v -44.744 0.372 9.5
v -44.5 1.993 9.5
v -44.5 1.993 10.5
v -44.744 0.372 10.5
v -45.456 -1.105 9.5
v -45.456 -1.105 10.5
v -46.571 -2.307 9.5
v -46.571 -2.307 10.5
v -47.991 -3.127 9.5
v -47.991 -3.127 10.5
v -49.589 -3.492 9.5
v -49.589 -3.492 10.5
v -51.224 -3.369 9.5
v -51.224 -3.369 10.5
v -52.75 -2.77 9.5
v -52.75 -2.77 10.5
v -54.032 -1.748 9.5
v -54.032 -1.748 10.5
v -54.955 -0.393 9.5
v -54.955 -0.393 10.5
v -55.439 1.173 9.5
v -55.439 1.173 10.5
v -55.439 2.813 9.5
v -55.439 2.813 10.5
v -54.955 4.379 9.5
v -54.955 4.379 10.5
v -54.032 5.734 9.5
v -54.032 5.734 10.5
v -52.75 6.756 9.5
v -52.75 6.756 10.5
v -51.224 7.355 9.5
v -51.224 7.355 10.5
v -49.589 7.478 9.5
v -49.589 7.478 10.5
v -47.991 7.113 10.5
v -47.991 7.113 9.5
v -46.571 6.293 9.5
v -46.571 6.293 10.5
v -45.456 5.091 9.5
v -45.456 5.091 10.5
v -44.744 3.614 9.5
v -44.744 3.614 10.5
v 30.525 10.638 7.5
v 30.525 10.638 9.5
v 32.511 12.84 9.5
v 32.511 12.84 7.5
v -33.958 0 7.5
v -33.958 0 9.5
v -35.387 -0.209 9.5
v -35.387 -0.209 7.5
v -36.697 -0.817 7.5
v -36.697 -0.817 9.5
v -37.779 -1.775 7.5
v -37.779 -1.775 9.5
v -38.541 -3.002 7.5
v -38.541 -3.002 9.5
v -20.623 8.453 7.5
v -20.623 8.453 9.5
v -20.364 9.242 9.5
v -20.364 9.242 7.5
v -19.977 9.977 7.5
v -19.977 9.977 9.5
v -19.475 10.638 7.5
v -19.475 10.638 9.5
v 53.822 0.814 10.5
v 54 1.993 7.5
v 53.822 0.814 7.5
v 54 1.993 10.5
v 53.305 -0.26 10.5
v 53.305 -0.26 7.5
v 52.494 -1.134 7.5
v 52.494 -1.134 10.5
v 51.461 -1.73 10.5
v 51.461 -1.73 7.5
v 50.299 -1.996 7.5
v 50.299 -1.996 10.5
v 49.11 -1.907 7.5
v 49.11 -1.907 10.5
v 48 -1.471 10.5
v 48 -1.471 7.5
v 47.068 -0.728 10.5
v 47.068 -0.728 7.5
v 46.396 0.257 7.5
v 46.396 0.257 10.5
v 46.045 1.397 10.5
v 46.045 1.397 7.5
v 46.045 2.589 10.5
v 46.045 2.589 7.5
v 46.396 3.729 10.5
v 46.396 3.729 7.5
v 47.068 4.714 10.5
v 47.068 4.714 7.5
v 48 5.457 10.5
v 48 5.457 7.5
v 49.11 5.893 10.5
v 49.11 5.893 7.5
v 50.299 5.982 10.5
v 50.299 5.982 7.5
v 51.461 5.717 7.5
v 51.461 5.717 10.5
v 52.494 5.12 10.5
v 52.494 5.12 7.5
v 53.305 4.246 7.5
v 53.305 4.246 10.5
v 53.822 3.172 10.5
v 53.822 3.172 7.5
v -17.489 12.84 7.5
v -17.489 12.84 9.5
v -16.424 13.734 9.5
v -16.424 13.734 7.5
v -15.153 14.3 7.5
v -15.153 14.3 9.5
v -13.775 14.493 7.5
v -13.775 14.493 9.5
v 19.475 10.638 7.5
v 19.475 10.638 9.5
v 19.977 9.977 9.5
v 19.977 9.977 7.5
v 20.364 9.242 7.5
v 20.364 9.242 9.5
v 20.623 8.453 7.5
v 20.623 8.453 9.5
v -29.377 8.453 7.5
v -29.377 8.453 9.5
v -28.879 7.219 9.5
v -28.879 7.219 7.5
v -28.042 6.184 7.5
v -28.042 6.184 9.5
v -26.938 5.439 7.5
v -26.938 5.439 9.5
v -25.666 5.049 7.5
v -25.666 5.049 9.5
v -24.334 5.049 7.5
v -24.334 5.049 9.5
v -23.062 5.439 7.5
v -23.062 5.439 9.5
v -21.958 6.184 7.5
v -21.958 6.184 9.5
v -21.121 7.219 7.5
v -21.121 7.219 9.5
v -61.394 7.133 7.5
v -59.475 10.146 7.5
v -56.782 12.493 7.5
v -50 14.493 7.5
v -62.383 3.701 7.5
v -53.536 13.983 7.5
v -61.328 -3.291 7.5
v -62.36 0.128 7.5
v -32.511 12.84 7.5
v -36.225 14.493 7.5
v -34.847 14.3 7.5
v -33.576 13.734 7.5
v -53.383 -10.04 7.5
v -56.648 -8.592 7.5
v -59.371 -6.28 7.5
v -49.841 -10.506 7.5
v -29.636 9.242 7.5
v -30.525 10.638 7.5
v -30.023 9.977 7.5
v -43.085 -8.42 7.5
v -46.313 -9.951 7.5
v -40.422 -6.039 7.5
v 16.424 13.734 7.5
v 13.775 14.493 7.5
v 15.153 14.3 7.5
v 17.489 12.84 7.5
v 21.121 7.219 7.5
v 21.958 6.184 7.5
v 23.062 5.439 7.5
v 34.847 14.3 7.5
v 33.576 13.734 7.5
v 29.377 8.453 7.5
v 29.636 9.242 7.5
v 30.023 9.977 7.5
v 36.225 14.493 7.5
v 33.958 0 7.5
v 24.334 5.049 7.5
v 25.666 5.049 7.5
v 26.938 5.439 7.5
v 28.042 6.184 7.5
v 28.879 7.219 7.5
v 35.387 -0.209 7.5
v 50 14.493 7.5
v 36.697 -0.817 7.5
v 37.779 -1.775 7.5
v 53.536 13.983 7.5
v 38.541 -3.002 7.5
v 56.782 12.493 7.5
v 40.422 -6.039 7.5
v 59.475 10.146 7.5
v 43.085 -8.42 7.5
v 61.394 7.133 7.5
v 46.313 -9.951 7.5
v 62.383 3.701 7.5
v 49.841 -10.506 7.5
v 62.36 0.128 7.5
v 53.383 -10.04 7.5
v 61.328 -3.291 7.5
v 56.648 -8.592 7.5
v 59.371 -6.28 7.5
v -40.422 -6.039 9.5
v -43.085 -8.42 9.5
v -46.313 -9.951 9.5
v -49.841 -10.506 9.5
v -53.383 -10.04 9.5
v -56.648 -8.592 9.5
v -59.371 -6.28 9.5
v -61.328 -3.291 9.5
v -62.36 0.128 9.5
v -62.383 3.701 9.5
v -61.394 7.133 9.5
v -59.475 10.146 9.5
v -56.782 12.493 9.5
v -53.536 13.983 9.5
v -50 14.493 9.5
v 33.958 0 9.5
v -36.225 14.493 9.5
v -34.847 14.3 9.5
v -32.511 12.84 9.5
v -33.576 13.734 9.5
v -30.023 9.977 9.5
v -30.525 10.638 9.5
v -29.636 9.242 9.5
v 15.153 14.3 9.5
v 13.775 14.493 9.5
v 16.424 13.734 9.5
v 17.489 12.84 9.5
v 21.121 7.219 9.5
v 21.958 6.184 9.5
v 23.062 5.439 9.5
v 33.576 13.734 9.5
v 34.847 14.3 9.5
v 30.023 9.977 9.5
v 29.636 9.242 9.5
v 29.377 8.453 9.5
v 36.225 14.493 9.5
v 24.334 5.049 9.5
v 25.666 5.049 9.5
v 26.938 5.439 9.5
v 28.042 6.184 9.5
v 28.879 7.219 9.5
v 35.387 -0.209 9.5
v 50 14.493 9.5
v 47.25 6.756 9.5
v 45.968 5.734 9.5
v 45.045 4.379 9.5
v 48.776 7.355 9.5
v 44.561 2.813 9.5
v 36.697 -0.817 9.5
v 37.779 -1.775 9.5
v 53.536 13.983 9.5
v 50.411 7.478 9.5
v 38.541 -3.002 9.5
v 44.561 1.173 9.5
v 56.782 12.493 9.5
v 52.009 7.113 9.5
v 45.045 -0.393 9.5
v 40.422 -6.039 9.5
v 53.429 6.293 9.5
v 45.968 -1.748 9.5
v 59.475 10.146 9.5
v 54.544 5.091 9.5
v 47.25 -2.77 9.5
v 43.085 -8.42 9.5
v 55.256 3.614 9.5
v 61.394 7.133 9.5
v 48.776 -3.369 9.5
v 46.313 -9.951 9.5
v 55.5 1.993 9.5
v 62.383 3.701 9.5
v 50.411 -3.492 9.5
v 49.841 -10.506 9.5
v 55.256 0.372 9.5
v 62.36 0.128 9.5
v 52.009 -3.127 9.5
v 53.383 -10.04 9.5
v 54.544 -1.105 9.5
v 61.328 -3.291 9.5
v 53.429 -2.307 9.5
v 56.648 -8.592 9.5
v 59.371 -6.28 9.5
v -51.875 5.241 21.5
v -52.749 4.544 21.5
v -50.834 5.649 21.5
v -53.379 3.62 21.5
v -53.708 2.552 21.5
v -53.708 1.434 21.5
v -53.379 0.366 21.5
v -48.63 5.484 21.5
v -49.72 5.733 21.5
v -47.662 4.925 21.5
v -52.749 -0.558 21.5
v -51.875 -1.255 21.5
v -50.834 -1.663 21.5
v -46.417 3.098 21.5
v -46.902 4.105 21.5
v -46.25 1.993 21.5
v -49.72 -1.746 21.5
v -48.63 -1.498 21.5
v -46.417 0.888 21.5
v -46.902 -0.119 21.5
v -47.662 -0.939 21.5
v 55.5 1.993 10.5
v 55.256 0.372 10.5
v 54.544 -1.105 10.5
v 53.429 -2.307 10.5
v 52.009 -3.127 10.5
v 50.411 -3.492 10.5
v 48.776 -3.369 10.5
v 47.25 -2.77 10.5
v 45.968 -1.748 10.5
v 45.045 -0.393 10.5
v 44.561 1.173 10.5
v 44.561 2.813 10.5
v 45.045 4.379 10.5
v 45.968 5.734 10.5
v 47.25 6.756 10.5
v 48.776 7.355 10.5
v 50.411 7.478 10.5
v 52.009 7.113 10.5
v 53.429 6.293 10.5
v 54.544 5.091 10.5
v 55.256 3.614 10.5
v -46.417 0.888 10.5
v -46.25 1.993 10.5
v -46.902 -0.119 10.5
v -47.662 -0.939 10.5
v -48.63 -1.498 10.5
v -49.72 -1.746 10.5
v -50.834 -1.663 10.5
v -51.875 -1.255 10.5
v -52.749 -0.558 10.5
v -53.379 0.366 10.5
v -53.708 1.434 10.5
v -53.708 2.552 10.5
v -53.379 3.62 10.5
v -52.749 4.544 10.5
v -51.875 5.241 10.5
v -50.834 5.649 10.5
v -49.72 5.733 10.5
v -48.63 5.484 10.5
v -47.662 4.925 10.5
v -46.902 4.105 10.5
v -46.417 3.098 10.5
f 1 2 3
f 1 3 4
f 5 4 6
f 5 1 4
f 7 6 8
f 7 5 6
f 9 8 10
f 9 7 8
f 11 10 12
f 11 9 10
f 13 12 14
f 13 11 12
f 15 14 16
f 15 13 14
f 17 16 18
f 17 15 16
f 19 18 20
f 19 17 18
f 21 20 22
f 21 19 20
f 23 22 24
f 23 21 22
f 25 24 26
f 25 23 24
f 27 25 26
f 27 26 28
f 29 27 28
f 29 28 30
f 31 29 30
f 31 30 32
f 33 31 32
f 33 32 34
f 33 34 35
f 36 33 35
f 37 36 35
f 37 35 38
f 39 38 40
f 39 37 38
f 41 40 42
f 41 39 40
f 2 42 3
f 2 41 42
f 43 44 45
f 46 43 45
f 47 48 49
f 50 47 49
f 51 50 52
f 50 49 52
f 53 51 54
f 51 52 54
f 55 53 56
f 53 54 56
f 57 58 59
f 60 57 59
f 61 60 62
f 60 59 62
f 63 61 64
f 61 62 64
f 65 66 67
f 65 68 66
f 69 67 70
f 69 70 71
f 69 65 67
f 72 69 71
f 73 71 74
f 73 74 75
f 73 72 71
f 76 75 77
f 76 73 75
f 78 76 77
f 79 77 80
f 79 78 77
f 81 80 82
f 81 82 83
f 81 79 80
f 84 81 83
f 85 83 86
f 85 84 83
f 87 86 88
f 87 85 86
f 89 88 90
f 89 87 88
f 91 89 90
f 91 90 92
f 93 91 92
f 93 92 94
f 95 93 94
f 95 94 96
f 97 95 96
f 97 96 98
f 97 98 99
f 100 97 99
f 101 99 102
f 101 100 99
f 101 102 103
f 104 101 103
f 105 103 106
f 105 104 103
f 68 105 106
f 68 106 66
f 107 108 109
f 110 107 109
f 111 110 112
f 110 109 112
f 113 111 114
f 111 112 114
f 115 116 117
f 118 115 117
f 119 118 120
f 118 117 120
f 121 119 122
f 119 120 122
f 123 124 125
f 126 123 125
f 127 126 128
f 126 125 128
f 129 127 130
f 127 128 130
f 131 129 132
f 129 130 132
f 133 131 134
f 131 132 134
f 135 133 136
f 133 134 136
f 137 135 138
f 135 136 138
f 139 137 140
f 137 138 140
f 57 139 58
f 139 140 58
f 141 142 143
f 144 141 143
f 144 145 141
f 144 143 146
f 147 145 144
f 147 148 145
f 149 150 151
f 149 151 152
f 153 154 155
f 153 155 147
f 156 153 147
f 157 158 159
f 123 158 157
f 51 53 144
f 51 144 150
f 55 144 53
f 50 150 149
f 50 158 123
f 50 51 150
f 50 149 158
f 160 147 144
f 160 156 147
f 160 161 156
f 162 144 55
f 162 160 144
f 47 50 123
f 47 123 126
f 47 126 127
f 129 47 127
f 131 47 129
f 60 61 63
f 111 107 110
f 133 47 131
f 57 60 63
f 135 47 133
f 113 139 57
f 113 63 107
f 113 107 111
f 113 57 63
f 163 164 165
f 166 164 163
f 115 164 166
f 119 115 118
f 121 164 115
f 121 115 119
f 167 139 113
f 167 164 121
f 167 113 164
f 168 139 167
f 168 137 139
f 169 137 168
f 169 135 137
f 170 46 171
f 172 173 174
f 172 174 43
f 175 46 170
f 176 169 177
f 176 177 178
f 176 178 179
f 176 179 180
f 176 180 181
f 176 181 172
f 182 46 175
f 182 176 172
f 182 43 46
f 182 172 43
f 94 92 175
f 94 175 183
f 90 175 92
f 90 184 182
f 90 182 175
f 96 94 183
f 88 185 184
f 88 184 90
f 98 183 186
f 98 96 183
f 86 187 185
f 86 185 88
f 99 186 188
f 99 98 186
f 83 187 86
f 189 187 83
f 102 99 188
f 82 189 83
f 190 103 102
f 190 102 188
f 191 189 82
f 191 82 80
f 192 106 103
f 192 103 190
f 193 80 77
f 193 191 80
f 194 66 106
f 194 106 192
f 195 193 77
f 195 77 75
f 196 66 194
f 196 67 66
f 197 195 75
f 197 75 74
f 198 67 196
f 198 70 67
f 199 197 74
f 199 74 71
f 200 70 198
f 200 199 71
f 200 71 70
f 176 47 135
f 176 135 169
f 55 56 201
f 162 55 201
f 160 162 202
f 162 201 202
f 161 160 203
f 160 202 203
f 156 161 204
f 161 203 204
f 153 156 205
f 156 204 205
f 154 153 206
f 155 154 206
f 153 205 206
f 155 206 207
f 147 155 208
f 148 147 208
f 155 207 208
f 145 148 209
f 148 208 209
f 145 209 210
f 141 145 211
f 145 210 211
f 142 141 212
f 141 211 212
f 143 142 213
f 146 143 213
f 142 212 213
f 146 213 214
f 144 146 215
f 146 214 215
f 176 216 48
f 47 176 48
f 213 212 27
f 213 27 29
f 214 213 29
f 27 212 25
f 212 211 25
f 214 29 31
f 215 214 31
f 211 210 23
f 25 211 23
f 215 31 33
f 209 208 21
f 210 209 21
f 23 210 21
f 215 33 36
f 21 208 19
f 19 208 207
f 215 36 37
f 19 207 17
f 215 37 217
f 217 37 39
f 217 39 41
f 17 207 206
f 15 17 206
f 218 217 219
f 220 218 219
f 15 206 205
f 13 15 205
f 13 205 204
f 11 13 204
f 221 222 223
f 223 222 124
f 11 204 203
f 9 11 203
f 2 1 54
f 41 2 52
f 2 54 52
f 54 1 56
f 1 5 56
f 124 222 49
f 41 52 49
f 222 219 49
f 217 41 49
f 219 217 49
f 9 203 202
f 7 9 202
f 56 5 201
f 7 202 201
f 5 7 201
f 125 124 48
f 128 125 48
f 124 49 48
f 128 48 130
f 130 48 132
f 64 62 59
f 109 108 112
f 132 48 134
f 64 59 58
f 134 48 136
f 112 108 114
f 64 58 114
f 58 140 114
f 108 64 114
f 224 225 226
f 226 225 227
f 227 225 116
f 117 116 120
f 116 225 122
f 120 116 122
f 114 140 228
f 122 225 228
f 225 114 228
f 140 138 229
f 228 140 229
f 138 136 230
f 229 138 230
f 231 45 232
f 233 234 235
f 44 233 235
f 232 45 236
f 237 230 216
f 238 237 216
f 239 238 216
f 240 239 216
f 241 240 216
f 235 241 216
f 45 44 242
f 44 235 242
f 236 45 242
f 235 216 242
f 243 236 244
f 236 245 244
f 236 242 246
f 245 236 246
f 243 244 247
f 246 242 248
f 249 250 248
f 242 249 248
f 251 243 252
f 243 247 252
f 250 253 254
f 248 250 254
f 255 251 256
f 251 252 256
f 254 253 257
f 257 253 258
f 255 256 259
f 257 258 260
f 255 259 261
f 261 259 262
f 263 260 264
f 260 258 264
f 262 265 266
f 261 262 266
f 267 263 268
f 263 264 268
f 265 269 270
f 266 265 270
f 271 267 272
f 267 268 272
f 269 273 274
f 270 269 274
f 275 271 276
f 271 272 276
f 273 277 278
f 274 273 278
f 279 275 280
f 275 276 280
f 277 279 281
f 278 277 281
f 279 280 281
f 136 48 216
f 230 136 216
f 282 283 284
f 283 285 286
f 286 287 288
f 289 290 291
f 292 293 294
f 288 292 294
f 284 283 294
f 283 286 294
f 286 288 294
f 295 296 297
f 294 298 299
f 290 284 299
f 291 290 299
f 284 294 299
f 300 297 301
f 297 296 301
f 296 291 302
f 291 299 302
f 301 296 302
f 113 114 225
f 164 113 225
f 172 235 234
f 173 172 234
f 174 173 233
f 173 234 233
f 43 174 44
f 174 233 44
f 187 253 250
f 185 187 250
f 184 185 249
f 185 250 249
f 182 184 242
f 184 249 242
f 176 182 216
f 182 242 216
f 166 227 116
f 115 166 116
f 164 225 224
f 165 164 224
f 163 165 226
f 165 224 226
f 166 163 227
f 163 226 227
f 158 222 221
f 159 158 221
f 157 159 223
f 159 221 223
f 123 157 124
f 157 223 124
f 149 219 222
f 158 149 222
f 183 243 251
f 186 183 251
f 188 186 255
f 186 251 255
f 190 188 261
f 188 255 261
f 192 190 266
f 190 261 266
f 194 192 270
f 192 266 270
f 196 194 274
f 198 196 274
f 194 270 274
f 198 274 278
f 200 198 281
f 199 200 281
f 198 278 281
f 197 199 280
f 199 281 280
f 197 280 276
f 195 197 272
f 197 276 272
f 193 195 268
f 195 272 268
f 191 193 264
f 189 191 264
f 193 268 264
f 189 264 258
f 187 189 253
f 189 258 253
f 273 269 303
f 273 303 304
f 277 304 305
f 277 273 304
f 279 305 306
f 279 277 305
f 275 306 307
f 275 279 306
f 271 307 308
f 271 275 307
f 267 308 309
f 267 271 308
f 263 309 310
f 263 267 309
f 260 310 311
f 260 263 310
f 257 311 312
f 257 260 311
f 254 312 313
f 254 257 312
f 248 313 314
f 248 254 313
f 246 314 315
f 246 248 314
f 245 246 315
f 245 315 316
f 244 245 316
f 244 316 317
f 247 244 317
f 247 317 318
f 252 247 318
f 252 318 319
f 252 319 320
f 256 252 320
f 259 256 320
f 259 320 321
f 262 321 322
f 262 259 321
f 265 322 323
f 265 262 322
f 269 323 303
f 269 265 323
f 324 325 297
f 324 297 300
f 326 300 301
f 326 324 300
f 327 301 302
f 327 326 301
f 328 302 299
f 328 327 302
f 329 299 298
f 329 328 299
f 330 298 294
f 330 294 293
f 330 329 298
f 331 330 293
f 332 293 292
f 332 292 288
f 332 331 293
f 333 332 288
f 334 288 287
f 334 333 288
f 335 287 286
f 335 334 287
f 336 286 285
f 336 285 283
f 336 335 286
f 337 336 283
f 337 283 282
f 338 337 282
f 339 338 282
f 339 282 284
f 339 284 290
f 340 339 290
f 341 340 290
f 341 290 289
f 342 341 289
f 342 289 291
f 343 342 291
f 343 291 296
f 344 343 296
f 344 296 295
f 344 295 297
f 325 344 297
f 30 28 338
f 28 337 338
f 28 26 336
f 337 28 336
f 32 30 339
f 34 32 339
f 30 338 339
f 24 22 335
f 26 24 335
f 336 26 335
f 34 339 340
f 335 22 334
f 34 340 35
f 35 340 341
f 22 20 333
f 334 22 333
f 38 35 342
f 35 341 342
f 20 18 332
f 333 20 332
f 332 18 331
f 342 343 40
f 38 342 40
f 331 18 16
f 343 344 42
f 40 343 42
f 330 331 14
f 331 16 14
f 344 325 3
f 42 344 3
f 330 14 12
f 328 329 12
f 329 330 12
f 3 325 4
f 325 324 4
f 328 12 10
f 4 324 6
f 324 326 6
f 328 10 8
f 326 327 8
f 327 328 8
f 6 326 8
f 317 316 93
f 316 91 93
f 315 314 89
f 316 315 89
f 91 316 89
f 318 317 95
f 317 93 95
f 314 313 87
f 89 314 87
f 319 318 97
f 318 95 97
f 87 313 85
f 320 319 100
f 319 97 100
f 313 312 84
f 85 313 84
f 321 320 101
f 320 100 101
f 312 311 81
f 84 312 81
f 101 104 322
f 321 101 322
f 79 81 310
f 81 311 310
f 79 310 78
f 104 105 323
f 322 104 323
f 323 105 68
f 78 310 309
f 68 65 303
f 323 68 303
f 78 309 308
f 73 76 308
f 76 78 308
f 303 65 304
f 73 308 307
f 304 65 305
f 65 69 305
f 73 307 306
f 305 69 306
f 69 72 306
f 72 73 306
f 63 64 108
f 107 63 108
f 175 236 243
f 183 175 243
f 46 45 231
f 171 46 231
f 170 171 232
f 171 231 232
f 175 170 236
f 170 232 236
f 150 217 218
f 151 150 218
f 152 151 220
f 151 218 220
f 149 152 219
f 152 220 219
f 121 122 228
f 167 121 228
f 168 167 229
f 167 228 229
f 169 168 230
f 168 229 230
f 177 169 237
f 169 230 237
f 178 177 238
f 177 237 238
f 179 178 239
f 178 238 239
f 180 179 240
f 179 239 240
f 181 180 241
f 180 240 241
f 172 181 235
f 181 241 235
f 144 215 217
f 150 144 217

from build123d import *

# Parameters (mm, degrees)
F0_R     = 5.5
F0_R_2   = 3.75
F0_R_3   = 4
F1_DEPTH = 2
F2_DEPTH = 12
F3_DEPTH = 1
F4_ANGLE = 90


with BuildPart() as f1:
    # F0 (on Front) → F1 (new body)
    with BuildSketch(Plane.XZ):
        with BuildLine():
            ThreePointArc((20.6234359139, 1.0467505913), (25, 4.5), (29.3765640861, 1.0467505913))
            ThreePointArc((29.3765640861, 1.0467505913), (29.8140239679, -0.117408547), (30.5252627854, -1.1375933304))
            Line((30.5252627854, -1.1375933304), (32.5105844978, -3.3404322227))
            ThreePointArc((32.5105844978, -3.3404322227), (34.1921257049, -4.5612374621), (36.2247347829, -4.9930320884))
            Line((36.2247347829, -4.9930320884), (50, -4.9930320884))
            ThreePointArc((50, -4.9930320884), (60.4567630389, 14.3557712193), (38.5413898737, 12.5019908319))
            ThreePointArc((38.5413898737, 12.5019908319), (36.6974671463, 10.3172947844), (33.9579458232, 9.5))
            Line((33.9579458232, 9.5), (-33.9579458232, 9.5))
            ThreePointArc((-33.9579458232, 9.5), (-36.6974671463, 10.3172947844), (-38.5413898737, 12.5019908319))
            ThreePointArc((-38.5413898737, 12.5019908319), (-60.4567630389, 14.3557712193), (-50, -4.9930320884))
            Line((-50, -4.9930320884), (-36.224734783, -4.9930320884))
            ThreePointArc((-36.224734783, -4.9930320884), (-34.1921257049, -4.5612374621), (-32.5105844978, -3.3404322227))
            Line((-32.5105844978, -3.3404322227), (-30.5252627854, -1.1375933304))
            ThreePointArc((-30.5252627854, -1.1375933304), (-29.8140239679, -0.117408547), (-29.3765640861, 1.0467505913))
            ThreePointArc((-29.3765640861, 1.0467505913), (-25, 4.5), (-20.6234359139, 1.0467505913))
            ThreePointArc((-20.6234359139, 1.0467505913), (-20.1859760321, -0.117408547), (-19.4747372146, -1.1375933304))
            Line((-19.4747372146, -1.1375933304), (-17.4894155022, -3.3404322227))
            ThreePointArc((-17.4894155022, -3.3404322227), (-15.8078742951, -4.5612374621), (-13.775265217, -4.9930320884))
            Line((-13.775265217, -4.9930320884), (13.775265217, -4.9930320884))
            ThreePointArc((13.775265217, -4.9930320884), (15.8078742951, -4.5612374621), (17.4894155022, -3.3404322227))
            Line((17.4894155022, -3.3404322227), (19.4747372146, -1.1375933304))
            ThreePointArc((19.4747372146, -1.1375933304), (20.1859760321, -0.117408547), (20.6234359139, 1.0467505913))
        make_face()
        with Locations((-50, 7.5069679116)):
            Circle(F0_R, mode=Mode.SUBTRACT)
        with Locations((50, 7.5069679116)):
            Circle(F0_R, mode=Mode.SUBTRACT)
        with Locations((-50, 7.5069679116)):
            Circle(F0_R)
        with Locations((-50, 7.5069679116)):
            Circle(F0_R_2, mode=Mode.SUBTRACT)
        with Locations((50, 7.5069679116)):
            Circle(F0_R)
        with Locations((50, 7.5069679116)):
            Circle(F0_R_3, mode=Mode.SUBTRACT)
        with Locations((-50, 7.5069679116)):
            Circle(F0_R_2)
    extrude(amount=F1_DEPTH)

    # F0 (on Front) → F2 (join)
    with BuildSketch(Plane.XZ):
        with Locations((-50, 7.5069679116)):
            Circle(F0_R_2)
    extrude(amount=-F2_DEPTH)

    # F0 (on Front) → F3 (join)
    with BuildSketch(Plane.XZ):
        with Locations((-50, 7.5069679116)):
            Circle(F0_R)
        with Locations((-50, 7.5069679116)):
            Circle(F0_R_2, mode=Mode.SUBTRACT)
        with Locations((50, 7.5069679116)):
            Circle(F0_R)
        with Locations((50, 7.5069679116)):
            Circle(F0_R_3, mode=Mode.SUBTRACT)
    extrude(amount=-F3_DEPTH)


with BuildPart() as f1_1:
    # F4: moved
    add(f1.part.rotate(Axis((0, 0, 9.5), (1, 0, 0)), F4_ANGLE))


solid = f1_1.part
